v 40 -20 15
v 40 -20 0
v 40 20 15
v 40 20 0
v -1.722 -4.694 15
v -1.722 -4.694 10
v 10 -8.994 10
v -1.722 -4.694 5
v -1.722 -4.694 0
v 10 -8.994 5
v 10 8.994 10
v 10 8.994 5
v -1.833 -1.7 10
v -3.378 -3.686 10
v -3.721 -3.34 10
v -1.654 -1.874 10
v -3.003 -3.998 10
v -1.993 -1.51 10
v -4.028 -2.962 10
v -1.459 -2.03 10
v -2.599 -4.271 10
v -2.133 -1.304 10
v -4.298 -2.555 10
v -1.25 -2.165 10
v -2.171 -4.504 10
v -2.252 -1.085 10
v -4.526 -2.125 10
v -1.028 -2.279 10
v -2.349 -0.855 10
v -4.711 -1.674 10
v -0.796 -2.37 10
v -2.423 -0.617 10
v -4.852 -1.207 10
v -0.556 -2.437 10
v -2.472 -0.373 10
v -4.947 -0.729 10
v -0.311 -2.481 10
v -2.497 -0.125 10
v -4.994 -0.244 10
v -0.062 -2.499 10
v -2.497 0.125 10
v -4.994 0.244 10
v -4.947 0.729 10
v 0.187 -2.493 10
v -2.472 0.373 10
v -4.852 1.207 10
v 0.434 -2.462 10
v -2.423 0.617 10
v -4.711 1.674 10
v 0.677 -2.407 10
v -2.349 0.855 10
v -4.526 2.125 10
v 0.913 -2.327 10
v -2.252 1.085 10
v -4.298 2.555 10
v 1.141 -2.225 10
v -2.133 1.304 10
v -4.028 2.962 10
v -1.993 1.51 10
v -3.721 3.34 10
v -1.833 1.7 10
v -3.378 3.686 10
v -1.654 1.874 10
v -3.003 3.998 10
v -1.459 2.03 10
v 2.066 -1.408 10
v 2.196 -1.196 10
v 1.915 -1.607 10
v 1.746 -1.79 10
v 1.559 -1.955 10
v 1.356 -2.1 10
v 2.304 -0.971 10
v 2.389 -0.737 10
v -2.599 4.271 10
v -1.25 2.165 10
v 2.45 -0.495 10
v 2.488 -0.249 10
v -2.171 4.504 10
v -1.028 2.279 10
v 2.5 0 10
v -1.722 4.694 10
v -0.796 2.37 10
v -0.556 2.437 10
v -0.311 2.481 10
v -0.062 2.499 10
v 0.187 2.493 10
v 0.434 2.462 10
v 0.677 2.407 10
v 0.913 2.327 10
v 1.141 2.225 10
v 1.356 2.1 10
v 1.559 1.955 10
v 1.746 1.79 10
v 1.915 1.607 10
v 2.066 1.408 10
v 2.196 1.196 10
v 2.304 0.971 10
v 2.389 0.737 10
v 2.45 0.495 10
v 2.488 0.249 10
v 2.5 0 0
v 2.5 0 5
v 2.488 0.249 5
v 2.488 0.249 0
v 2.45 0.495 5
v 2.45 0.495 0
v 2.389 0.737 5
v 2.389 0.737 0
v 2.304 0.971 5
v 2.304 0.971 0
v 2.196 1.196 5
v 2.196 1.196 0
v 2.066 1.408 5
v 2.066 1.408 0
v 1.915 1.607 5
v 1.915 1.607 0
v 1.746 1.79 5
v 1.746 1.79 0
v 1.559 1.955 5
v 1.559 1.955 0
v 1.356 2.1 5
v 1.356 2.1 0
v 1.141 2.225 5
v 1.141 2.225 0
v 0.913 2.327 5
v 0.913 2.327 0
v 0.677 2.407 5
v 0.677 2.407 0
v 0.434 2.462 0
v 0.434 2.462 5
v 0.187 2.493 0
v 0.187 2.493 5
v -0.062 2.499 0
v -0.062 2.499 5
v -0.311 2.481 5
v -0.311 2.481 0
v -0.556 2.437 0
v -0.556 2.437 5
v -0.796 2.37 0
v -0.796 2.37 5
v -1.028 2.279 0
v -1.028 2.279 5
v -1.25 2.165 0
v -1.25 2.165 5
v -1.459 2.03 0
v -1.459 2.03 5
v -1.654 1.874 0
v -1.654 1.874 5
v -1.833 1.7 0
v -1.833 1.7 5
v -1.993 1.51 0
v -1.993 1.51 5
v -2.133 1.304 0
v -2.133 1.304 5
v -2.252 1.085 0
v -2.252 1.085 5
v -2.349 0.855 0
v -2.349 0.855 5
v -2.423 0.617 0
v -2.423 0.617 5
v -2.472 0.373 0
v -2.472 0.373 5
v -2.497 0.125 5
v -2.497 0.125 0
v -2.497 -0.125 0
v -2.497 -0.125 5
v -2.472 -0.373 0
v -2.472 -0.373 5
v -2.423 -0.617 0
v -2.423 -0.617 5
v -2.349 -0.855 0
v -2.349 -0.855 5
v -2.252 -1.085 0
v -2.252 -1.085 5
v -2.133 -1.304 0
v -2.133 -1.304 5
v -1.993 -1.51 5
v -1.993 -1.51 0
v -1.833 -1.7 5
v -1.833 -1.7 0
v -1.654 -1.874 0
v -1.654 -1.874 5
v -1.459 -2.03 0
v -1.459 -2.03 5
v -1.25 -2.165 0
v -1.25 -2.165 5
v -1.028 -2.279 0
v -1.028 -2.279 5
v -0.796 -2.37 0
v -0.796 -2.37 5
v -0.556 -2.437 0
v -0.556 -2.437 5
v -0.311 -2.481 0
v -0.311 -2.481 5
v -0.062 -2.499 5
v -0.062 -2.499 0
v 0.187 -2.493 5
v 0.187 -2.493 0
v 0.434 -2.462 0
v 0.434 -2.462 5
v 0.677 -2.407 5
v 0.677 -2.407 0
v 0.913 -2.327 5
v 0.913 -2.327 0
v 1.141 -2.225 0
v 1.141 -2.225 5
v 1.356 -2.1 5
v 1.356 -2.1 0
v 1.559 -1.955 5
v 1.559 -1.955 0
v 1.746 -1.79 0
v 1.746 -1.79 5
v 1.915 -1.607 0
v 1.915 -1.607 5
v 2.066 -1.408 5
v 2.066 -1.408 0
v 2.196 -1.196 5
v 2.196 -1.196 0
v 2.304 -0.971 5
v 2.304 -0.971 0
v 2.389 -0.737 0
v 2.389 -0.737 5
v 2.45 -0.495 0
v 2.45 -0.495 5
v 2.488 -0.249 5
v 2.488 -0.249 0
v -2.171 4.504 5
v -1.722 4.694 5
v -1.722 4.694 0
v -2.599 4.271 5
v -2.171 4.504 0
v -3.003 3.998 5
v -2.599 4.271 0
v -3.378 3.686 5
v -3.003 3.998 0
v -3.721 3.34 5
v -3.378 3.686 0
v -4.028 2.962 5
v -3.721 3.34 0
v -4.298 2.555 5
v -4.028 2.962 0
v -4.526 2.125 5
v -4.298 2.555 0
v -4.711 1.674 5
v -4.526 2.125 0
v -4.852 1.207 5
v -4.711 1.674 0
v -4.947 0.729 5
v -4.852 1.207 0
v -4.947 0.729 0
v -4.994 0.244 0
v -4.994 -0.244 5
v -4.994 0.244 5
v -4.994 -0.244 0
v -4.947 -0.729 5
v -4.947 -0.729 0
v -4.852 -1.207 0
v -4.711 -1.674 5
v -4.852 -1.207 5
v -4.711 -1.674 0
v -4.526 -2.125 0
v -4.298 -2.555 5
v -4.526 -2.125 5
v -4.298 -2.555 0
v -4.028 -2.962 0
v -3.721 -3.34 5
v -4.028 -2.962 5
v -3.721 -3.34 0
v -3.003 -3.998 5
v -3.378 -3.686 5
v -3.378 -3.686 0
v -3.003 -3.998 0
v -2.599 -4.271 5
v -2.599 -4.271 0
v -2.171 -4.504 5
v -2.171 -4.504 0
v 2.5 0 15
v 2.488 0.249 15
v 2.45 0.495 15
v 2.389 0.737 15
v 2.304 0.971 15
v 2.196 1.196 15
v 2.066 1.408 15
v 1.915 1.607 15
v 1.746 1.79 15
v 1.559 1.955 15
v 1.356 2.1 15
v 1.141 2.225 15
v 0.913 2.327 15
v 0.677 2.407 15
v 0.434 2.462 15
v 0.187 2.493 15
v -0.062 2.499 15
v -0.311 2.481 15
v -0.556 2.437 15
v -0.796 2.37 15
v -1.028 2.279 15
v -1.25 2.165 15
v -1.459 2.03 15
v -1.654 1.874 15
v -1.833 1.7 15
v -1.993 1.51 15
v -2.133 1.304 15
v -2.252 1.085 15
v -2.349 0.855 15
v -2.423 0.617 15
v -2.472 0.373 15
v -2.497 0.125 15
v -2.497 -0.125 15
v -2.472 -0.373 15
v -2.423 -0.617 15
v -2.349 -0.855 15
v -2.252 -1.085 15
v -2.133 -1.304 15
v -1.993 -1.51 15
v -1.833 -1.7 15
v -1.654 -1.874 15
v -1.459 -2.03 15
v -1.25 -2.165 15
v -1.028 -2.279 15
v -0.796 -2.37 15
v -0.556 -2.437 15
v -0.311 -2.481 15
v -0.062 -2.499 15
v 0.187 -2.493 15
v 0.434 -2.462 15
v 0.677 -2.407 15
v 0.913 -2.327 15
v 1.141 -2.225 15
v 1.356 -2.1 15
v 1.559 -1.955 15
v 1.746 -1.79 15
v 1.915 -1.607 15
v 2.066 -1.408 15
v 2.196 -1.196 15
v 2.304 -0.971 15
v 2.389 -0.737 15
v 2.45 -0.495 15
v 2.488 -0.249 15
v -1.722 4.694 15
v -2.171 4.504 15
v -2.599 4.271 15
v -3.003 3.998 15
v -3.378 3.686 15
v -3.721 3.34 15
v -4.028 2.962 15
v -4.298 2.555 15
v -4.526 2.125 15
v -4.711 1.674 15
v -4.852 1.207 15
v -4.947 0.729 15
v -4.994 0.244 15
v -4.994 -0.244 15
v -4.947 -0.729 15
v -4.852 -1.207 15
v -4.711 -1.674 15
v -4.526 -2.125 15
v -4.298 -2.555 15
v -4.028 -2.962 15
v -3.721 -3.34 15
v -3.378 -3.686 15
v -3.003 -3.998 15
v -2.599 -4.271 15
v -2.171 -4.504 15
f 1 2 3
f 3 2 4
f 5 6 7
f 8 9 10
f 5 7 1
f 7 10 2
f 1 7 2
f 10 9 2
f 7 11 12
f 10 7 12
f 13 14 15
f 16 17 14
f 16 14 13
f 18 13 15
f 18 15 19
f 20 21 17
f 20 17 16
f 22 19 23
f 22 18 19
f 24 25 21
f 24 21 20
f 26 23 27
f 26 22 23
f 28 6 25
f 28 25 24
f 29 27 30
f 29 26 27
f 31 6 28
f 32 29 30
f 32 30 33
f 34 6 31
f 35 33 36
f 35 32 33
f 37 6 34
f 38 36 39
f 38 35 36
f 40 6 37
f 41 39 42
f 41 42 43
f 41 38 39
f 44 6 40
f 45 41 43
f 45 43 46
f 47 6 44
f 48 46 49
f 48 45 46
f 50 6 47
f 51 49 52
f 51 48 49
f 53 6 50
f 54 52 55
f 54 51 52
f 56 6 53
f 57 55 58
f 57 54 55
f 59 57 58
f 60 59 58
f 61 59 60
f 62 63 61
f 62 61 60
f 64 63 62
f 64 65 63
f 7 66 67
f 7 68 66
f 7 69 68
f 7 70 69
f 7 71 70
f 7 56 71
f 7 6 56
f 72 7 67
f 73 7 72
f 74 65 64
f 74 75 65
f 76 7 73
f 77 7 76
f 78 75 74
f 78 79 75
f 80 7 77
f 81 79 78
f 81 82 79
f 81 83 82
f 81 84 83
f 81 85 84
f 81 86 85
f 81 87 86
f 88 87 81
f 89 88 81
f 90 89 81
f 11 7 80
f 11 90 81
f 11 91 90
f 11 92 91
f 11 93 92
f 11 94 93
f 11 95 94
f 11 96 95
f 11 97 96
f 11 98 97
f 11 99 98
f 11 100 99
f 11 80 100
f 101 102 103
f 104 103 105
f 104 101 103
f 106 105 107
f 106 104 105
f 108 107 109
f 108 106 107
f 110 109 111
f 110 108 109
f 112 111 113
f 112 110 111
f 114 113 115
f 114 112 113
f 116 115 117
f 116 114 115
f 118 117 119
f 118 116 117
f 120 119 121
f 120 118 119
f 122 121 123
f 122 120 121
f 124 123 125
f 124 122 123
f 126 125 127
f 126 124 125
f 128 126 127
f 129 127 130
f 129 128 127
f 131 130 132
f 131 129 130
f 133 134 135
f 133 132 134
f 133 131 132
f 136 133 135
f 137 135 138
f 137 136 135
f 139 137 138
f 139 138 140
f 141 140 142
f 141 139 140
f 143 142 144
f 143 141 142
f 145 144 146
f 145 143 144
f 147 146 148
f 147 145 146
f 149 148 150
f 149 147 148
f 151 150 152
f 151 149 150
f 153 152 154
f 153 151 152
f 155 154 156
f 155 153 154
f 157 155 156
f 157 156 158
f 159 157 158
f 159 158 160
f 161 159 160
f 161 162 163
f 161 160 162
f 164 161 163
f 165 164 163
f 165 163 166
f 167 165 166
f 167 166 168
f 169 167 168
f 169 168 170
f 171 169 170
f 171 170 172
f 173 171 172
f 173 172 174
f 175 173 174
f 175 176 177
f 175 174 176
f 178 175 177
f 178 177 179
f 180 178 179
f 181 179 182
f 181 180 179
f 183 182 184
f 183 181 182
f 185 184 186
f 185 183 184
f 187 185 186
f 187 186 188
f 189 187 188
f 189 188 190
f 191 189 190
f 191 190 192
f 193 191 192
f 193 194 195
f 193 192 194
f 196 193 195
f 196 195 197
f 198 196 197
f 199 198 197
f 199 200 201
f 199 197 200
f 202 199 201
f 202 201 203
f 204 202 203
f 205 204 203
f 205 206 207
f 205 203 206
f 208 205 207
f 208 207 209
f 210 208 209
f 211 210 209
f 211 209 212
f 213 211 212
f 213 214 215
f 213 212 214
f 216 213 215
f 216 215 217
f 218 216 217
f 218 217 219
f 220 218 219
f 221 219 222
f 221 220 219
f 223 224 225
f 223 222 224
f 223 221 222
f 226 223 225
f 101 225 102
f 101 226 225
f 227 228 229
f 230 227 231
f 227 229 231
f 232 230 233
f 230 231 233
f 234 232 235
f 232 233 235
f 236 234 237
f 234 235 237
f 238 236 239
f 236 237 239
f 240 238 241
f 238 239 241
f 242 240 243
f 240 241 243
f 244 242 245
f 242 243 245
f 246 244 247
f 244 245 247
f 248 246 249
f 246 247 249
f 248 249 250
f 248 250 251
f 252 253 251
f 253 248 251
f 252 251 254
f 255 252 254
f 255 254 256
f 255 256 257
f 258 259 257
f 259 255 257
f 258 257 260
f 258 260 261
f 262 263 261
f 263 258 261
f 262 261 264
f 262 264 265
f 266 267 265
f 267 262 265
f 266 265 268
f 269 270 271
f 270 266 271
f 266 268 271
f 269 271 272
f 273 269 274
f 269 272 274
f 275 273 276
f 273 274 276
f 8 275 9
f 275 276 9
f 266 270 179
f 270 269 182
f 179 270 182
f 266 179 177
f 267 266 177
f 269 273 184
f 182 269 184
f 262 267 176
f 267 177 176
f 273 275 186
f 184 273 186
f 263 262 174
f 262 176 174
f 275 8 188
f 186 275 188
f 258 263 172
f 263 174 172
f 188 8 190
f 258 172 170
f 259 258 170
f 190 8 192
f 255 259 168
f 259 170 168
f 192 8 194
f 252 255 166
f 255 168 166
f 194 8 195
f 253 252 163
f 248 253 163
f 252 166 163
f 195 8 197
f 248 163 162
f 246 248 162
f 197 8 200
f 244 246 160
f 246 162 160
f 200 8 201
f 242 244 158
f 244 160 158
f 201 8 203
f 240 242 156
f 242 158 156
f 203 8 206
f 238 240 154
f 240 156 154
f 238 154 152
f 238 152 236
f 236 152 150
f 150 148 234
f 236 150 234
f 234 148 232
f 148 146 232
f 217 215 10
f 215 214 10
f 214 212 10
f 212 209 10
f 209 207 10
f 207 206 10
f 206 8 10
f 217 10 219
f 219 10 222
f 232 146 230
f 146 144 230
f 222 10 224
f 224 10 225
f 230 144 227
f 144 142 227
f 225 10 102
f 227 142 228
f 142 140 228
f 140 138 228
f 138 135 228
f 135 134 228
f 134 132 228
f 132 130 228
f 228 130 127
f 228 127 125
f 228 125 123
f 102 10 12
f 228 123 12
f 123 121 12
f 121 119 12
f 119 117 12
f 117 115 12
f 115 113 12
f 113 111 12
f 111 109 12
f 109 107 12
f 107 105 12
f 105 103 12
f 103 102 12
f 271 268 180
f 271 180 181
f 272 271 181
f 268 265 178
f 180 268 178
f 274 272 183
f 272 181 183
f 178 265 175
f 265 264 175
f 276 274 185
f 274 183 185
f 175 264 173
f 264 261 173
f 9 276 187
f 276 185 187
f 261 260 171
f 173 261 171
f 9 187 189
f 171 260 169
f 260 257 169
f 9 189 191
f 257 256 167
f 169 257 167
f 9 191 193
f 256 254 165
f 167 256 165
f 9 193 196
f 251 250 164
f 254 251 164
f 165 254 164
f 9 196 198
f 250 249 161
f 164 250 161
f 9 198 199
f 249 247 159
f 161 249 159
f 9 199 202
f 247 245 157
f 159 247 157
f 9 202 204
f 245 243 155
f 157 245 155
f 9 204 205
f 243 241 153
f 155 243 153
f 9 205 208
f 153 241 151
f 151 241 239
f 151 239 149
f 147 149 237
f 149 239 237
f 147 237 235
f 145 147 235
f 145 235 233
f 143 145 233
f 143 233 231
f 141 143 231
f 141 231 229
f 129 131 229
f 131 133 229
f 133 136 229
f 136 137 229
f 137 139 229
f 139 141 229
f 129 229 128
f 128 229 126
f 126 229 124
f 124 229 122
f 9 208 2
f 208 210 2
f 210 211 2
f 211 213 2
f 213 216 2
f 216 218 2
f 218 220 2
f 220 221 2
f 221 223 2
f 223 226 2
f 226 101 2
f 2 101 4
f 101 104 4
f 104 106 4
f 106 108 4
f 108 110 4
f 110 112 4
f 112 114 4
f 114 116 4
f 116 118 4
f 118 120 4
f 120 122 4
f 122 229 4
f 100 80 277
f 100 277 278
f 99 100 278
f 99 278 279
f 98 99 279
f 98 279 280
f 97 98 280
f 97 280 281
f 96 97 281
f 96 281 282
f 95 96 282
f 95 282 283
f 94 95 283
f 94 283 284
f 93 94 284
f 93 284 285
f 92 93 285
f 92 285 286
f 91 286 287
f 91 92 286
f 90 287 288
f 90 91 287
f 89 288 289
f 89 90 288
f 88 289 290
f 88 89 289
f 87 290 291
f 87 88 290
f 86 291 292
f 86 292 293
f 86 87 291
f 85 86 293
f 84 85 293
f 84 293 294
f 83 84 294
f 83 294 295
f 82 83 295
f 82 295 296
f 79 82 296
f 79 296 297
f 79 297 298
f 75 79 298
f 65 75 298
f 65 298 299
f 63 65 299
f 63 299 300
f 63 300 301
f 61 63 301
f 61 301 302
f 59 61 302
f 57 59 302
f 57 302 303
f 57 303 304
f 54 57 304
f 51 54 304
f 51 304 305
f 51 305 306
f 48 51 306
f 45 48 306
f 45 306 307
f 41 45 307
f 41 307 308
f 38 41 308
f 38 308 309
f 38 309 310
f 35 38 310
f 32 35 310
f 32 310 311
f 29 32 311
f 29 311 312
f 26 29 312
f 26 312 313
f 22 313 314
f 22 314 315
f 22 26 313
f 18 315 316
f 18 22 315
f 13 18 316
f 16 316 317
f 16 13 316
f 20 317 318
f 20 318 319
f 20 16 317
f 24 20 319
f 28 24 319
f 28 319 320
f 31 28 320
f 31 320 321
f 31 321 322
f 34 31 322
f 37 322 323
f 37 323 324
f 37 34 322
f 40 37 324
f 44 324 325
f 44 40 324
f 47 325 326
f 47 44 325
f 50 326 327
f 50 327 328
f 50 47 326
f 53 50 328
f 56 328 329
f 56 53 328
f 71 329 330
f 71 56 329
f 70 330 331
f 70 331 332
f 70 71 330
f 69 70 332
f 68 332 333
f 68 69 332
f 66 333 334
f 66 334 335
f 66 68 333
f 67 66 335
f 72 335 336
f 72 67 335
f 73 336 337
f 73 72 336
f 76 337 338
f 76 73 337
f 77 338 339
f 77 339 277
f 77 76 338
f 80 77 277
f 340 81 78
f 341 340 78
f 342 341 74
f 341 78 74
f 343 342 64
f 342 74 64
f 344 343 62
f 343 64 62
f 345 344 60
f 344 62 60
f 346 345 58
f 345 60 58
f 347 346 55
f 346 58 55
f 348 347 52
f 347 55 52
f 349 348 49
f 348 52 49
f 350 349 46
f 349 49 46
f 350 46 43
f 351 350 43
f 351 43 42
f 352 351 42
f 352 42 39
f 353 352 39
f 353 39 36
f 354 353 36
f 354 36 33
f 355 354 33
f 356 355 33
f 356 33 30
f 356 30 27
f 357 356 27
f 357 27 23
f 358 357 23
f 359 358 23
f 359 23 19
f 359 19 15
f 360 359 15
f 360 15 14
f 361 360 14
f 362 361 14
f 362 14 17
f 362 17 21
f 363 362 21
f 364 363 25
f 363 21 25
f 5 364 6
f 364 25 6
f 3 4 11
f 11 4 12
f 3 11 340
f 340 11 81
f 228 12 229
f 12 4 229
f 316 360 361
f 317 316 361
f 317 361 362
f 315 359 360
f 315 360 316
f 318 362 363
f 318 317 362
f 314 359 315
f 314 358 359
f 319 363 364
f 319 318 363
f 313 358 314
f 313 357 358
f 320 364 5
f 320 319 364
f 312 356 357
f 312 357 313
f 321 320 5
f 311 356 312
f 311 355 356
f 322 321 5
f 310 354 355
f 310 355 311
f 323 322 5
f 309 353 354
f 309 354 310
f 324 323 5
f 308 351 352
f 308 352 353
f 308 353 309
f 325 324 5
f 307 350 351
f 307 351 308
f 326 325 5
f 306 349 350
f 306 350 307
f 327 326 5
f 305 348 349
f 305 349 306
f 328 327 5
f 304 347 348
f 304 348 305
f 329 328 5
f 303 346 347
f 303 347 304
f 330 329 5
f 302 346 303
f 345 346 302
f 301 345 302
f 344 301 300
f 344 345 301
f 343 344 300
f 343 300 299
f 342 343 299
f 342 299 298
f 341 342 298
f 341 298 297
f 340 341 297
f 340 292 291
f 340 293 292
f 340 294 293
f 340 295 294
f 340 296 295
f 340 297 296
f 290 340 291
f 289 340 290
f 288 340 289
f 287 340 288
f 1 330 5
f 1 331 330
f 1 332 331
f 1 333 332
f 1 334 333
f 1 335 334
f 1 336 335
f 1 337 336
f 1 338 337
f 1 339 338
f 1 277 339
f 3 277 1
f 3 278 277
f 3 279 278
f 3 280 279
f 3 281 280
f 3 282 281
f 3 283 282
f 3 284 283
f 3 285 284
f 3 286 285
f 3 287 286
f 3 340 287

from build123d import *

# Parameters (mm, degrees)
SKETCH1_R           = 2.5
BOSS_EXTRUDE1_DEPTH = 15
CUT_EXTRUDE1_START  = -30
SKETCH2_W           = 5
SKETCH2_H           = 40
CUT_EXTRUDE1_DEPTH  = 22.478150705


with BuildPart() as part:
    # Sketch1 → Boss-Extrude1 (new body)
    with BuildSketch(Plane.XY):
        with BuildLine():
            Line((40, 20), (-1.722048604, 4.694097209))
            ThreePointArc((-1.722048604, 4.694097209), (-5, 0), (-1.722048604, -4.694097209))
            Line((-1.722048604, -4.694097209), (40, -20))
            Line((40, -20), (40, 0))
            Line((40, 0), (40, 20))
        make_face()
        Circle(SKETCH1_R, mode=Mode.SUBTRACT)
    extrude(amount=BOSS_EXTRUDE1_DEPTH)

    # Sketch2 → Cut-Extrude1 (cut, through all)
    with BuildSketch(Plane(origin=(40, 0, 0), x_dir=(0, 0, -1), z_dir=(1, 0, 0)).offset(CUT_EXTRUDE1_START)):
        with Locations((-7.5, 0)):
            Rectangle(SKETCH2_W, SKETCH2_H)
    extrude(amount=-CUT_EXTRUDE1_DEPTH, mode=Mode.SUBTRACT)


solid = part.part
